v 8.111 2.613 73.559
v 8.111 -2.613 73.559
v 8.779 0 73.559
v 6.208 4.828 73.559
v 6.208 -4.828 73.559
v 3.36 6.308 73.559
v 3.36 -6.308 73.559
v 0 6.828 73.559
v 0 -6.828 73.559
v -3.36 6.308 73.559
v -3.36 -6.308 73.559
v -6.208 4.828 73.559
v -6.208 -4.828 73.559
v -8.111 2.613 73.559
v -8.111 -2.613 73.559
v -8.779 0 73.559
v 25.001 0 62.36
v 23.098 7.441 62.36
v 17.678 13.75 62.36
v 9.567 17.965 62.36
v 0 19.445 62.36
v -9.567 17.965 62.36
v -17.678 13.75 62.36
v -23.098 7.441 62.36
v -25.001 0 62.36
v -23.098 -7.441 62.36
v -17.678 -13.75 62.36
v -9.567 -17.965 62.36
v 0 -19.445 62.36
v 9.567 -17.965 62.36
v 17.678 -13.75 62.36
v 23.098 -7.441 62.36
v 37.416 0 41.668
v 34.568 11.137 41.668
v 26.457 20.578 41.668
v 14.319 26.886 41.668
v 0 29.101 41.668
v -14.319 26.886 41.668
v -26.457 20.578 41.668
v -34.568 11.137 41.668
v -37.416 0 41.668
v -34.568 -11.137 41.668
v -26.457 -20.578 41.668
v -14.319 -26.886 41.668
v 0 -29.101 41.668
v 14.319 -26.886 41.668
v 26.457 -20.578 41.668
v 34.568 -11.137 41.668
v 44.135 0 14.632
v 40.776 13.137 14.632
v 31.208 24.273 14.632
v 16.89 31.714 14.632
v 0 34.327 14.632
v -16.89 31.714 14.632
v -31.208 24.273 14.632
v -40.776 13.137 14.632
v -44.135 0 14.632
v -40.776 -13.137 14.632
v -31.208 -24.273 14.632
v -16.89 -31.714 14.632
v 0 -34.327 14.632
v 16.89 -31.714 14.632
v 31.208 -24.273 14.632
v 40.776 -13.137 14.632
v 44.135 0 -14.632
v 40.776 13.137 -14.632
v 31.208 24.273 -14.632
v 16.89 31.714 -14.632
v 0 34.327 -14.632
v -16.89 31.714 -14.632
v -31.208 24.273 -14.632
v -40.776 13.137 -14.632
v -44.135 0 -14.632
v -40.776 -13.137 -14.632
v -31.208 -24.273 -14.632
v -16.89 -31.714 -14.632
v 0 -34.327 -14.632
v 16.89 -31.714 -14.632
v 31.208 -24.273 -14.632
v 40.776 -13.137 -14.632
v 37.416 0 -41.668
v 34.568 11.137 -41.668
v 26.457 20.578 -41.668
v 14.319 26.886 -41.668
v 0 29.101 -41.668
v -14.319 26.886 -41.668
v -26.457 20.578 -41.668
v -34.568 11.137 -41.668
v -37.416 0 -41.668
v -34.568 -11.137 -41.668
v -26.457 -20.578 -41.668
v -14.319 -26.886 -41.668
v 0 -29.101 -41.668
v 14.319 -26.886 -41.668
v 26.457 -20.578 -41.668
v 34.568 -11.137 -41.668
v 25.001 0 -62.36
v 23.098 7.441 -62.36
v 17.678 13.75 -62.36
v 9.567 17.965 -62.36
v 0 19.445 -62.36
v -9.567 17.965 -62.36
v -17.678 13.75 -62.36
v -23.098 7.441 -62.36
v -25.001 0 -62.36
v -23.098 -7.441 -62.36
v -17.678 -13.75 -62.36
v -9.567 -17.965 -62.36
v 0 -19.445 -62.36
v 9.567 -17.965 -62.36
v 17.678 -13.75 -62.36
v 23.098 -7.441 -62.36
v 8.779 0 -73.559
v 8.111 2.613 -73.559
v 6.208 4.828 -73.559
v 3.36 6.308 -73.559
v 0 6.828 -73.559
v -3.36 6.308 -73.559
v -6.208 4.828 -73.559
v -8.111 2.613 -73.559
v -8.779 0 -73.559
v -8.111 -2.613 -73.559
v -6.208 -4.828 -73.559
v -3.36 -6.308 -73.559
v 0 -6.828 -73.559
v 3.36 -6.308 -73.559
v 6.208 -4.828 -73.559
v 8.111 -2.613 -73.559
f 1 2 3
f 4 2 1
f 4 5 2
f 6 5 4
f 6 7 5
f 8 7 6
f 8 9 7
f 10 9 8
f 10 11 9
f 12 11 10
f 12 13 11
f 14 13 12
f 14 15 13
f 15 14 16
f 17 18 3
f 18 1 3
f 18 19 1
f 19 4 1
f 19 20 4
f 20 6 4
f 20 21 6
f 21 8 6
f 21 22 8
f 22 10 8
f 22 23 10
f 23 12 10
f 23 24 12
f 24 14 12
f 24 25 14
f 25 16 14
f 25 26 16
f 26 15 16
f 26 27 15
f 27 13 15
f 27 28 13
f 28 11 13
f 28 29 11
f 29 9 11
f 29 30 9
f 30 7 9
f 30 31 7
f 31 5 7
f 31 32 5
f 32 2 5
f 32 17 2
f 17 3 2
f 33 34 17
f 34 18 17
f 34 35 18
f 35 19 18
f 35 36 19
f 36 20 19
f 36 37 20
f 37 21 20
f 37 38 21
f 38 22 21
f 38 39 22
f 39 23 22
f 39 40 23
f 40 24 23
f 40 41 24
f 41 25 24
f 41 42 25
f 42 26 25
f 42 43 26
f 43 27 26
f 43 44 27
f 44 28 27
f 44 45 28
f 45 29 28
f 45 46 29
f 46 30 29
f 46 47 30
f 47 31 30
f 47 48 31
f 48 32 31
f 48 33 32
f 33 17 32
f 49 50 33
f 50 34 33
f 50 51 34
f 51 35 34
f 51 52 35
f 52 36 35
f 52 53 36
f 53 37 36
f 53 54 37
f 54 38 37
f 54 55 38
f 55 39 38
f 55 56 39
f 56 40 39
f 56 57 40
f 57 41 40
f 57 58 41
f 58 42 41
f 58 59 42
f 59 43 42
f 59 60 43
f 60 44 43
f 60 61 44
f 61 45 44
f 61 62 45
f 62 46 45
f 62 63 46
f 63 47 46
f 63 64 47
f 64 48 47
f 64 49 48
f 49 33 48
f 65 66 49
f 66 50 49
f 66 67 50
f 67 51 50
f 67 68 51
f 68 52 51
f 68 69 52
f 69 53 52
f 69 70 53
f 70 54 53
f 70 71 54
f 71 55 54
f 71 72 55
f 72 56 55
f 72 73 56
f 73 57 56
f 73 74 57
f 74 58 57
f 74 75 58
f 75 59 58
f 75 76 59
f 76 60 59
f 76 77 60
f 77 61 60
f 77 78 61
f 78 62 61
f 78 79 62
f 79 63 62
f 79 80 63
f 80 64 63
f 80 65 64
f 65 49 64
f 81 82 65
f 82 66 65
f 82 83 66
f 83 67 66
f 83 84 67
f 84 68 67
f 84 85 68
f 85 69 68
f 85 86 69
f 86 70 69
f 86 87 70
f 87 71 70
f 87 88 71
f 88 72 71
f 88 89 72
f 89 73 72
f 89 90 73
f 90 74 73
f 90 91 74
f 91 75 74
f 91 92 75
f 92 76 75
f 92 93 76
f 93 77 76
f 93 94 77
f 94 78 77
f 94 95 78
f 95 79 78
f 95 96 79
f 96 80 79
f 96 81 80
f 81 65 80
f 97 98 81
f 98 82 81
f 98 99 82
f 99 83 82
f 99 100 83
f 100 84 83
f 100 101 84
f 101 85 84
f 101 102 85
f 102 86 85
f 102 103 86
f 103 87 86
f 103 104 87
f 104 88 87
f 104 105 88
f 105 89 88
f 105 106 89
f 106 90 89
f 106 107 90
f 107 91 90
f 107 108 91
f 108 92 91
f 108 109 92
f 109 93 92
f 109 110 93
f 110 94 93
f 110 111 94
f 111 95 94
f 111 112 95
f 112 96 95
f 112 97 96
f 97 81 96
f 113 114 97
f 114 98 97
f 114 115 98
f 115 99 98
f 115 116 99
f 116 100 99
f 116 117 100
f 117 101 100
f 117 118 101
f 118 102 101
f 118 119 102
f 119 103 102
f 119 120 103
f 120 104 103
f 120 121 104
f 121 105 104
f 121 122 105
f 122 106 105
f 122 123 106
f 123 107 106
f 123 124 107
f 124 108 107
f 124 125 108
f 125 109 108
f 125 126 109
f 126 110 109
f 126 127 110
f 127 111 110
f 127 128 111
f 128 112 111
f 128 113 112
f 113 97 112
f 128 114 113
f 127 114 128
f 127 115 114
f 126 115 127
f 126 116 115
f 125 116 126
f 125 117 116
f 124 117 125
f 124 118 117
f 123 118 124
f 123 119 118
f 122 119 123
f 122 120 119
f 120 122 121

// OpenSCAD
// Generated by SolidPython 1.0.1 on 2020-07-29 00:46:48


scale(v = [9, 7, 15]) {
	sphere(r = 5);
}
/***********************************************
*********      SolidPython code:      **********
************************************************
 
# import packages: SolidPython
from solid import *
from solid.utils import *
from itertools import chain, combinations, permutations


class Resize:

    def __init__(self, scad_file):
        self.scad_file = scad_file
        #self.scad_file = import_scad(scad_file)
        # cone/cylinder param:
        self.r1 = 0
        self.r2 = 0
        self.h = 0
        # rectangular prism param:
        self.w = 0
        self.l = 0
        # ellipse param:
        self.r = 0

    # import OpenScad code (file name corresponds to shape)


    # classify shape + parameters
    def assign(self, param1, param2, param3):
        if self.scad_file == 'cone.scad':
            self.r1 = param1
            self.r2 = param2
            self.h = param3
        elif self.scad_file == 'cylinder.scad':
            self.r1 = param1
            self.r2 = param2
            self.h = param3
        elif self.scad_file == 'rectangularPrism.scad':
            self.h = param1
            self.l = param2
            self.w = param3
        else:
            self.r = param1
            self.h = param2

    # resize parameters
    def iterate(self):
        x = range(3, 20, 2)
        i = 1
        if self.scad_file == 'cone.scad':
            tempList = list(permutations(x, 2))
            for temp in tempList:
                param1 = temp[0]
                param2 = temp[1]
                filepath = 'produced_scad_files/' + 'cone' + str(param1) + '_' + str(param2) + '_' + '.scad'
                scad_render_to_file(cylinder(h=param1, r1=param2, r2=0), filepath)

        elif self.scad_file == 'cylinder.scad':
            tempList = list(permutations(x, 3))
            for temp in tempList:
                param1 = temp[0]
                param2 = temp[1]
                filepath = 'produced_scad_files/' + 'cylinder' + str(param1) + '_' + str(param2) + '_' + '.scad'
                scad_render_to_file(cylinder(h=param1, r1=param2, r2=param2), filepath)

        elif self.scad_file == 'rectangularPrism.scad':
            tempList = list(permutations(x, 3))
            for temp in tempList:
                param1 = temp[0]
                param2 = temp[1]
                param3 = temp[2]
                filepath = 'produced_scad_files/' + 'rectangularPrism' + str(param1) + '_' + str(param2) + '_' + str(
                    param3) + '.scad'
                scad_render_to_file(cube(size=(param1, param2, param3)), filepath)

        elif self.scad_file == 'ellipse.scad':
            tempList = list(permutations(x, 4))
            for temp in tempList:
                param1 = temp[0]
                param2 = temp[1]
                param3 = temp[2]
                param4 = temp[3]
                filepath = 'produced_scad_files/' + 'ellipse' + str(param1) + '_' + str(param2) + '_' + str(param3) + '_' + str(param4) + '.scad'
                scad_render_to_file(scale([param1, param2, param3])(sphere(r=param4)), filepath)

    def render_to_scadfile(self):
        scad_render_to_file(scad, 'example.scad') 
 
************************************************/
